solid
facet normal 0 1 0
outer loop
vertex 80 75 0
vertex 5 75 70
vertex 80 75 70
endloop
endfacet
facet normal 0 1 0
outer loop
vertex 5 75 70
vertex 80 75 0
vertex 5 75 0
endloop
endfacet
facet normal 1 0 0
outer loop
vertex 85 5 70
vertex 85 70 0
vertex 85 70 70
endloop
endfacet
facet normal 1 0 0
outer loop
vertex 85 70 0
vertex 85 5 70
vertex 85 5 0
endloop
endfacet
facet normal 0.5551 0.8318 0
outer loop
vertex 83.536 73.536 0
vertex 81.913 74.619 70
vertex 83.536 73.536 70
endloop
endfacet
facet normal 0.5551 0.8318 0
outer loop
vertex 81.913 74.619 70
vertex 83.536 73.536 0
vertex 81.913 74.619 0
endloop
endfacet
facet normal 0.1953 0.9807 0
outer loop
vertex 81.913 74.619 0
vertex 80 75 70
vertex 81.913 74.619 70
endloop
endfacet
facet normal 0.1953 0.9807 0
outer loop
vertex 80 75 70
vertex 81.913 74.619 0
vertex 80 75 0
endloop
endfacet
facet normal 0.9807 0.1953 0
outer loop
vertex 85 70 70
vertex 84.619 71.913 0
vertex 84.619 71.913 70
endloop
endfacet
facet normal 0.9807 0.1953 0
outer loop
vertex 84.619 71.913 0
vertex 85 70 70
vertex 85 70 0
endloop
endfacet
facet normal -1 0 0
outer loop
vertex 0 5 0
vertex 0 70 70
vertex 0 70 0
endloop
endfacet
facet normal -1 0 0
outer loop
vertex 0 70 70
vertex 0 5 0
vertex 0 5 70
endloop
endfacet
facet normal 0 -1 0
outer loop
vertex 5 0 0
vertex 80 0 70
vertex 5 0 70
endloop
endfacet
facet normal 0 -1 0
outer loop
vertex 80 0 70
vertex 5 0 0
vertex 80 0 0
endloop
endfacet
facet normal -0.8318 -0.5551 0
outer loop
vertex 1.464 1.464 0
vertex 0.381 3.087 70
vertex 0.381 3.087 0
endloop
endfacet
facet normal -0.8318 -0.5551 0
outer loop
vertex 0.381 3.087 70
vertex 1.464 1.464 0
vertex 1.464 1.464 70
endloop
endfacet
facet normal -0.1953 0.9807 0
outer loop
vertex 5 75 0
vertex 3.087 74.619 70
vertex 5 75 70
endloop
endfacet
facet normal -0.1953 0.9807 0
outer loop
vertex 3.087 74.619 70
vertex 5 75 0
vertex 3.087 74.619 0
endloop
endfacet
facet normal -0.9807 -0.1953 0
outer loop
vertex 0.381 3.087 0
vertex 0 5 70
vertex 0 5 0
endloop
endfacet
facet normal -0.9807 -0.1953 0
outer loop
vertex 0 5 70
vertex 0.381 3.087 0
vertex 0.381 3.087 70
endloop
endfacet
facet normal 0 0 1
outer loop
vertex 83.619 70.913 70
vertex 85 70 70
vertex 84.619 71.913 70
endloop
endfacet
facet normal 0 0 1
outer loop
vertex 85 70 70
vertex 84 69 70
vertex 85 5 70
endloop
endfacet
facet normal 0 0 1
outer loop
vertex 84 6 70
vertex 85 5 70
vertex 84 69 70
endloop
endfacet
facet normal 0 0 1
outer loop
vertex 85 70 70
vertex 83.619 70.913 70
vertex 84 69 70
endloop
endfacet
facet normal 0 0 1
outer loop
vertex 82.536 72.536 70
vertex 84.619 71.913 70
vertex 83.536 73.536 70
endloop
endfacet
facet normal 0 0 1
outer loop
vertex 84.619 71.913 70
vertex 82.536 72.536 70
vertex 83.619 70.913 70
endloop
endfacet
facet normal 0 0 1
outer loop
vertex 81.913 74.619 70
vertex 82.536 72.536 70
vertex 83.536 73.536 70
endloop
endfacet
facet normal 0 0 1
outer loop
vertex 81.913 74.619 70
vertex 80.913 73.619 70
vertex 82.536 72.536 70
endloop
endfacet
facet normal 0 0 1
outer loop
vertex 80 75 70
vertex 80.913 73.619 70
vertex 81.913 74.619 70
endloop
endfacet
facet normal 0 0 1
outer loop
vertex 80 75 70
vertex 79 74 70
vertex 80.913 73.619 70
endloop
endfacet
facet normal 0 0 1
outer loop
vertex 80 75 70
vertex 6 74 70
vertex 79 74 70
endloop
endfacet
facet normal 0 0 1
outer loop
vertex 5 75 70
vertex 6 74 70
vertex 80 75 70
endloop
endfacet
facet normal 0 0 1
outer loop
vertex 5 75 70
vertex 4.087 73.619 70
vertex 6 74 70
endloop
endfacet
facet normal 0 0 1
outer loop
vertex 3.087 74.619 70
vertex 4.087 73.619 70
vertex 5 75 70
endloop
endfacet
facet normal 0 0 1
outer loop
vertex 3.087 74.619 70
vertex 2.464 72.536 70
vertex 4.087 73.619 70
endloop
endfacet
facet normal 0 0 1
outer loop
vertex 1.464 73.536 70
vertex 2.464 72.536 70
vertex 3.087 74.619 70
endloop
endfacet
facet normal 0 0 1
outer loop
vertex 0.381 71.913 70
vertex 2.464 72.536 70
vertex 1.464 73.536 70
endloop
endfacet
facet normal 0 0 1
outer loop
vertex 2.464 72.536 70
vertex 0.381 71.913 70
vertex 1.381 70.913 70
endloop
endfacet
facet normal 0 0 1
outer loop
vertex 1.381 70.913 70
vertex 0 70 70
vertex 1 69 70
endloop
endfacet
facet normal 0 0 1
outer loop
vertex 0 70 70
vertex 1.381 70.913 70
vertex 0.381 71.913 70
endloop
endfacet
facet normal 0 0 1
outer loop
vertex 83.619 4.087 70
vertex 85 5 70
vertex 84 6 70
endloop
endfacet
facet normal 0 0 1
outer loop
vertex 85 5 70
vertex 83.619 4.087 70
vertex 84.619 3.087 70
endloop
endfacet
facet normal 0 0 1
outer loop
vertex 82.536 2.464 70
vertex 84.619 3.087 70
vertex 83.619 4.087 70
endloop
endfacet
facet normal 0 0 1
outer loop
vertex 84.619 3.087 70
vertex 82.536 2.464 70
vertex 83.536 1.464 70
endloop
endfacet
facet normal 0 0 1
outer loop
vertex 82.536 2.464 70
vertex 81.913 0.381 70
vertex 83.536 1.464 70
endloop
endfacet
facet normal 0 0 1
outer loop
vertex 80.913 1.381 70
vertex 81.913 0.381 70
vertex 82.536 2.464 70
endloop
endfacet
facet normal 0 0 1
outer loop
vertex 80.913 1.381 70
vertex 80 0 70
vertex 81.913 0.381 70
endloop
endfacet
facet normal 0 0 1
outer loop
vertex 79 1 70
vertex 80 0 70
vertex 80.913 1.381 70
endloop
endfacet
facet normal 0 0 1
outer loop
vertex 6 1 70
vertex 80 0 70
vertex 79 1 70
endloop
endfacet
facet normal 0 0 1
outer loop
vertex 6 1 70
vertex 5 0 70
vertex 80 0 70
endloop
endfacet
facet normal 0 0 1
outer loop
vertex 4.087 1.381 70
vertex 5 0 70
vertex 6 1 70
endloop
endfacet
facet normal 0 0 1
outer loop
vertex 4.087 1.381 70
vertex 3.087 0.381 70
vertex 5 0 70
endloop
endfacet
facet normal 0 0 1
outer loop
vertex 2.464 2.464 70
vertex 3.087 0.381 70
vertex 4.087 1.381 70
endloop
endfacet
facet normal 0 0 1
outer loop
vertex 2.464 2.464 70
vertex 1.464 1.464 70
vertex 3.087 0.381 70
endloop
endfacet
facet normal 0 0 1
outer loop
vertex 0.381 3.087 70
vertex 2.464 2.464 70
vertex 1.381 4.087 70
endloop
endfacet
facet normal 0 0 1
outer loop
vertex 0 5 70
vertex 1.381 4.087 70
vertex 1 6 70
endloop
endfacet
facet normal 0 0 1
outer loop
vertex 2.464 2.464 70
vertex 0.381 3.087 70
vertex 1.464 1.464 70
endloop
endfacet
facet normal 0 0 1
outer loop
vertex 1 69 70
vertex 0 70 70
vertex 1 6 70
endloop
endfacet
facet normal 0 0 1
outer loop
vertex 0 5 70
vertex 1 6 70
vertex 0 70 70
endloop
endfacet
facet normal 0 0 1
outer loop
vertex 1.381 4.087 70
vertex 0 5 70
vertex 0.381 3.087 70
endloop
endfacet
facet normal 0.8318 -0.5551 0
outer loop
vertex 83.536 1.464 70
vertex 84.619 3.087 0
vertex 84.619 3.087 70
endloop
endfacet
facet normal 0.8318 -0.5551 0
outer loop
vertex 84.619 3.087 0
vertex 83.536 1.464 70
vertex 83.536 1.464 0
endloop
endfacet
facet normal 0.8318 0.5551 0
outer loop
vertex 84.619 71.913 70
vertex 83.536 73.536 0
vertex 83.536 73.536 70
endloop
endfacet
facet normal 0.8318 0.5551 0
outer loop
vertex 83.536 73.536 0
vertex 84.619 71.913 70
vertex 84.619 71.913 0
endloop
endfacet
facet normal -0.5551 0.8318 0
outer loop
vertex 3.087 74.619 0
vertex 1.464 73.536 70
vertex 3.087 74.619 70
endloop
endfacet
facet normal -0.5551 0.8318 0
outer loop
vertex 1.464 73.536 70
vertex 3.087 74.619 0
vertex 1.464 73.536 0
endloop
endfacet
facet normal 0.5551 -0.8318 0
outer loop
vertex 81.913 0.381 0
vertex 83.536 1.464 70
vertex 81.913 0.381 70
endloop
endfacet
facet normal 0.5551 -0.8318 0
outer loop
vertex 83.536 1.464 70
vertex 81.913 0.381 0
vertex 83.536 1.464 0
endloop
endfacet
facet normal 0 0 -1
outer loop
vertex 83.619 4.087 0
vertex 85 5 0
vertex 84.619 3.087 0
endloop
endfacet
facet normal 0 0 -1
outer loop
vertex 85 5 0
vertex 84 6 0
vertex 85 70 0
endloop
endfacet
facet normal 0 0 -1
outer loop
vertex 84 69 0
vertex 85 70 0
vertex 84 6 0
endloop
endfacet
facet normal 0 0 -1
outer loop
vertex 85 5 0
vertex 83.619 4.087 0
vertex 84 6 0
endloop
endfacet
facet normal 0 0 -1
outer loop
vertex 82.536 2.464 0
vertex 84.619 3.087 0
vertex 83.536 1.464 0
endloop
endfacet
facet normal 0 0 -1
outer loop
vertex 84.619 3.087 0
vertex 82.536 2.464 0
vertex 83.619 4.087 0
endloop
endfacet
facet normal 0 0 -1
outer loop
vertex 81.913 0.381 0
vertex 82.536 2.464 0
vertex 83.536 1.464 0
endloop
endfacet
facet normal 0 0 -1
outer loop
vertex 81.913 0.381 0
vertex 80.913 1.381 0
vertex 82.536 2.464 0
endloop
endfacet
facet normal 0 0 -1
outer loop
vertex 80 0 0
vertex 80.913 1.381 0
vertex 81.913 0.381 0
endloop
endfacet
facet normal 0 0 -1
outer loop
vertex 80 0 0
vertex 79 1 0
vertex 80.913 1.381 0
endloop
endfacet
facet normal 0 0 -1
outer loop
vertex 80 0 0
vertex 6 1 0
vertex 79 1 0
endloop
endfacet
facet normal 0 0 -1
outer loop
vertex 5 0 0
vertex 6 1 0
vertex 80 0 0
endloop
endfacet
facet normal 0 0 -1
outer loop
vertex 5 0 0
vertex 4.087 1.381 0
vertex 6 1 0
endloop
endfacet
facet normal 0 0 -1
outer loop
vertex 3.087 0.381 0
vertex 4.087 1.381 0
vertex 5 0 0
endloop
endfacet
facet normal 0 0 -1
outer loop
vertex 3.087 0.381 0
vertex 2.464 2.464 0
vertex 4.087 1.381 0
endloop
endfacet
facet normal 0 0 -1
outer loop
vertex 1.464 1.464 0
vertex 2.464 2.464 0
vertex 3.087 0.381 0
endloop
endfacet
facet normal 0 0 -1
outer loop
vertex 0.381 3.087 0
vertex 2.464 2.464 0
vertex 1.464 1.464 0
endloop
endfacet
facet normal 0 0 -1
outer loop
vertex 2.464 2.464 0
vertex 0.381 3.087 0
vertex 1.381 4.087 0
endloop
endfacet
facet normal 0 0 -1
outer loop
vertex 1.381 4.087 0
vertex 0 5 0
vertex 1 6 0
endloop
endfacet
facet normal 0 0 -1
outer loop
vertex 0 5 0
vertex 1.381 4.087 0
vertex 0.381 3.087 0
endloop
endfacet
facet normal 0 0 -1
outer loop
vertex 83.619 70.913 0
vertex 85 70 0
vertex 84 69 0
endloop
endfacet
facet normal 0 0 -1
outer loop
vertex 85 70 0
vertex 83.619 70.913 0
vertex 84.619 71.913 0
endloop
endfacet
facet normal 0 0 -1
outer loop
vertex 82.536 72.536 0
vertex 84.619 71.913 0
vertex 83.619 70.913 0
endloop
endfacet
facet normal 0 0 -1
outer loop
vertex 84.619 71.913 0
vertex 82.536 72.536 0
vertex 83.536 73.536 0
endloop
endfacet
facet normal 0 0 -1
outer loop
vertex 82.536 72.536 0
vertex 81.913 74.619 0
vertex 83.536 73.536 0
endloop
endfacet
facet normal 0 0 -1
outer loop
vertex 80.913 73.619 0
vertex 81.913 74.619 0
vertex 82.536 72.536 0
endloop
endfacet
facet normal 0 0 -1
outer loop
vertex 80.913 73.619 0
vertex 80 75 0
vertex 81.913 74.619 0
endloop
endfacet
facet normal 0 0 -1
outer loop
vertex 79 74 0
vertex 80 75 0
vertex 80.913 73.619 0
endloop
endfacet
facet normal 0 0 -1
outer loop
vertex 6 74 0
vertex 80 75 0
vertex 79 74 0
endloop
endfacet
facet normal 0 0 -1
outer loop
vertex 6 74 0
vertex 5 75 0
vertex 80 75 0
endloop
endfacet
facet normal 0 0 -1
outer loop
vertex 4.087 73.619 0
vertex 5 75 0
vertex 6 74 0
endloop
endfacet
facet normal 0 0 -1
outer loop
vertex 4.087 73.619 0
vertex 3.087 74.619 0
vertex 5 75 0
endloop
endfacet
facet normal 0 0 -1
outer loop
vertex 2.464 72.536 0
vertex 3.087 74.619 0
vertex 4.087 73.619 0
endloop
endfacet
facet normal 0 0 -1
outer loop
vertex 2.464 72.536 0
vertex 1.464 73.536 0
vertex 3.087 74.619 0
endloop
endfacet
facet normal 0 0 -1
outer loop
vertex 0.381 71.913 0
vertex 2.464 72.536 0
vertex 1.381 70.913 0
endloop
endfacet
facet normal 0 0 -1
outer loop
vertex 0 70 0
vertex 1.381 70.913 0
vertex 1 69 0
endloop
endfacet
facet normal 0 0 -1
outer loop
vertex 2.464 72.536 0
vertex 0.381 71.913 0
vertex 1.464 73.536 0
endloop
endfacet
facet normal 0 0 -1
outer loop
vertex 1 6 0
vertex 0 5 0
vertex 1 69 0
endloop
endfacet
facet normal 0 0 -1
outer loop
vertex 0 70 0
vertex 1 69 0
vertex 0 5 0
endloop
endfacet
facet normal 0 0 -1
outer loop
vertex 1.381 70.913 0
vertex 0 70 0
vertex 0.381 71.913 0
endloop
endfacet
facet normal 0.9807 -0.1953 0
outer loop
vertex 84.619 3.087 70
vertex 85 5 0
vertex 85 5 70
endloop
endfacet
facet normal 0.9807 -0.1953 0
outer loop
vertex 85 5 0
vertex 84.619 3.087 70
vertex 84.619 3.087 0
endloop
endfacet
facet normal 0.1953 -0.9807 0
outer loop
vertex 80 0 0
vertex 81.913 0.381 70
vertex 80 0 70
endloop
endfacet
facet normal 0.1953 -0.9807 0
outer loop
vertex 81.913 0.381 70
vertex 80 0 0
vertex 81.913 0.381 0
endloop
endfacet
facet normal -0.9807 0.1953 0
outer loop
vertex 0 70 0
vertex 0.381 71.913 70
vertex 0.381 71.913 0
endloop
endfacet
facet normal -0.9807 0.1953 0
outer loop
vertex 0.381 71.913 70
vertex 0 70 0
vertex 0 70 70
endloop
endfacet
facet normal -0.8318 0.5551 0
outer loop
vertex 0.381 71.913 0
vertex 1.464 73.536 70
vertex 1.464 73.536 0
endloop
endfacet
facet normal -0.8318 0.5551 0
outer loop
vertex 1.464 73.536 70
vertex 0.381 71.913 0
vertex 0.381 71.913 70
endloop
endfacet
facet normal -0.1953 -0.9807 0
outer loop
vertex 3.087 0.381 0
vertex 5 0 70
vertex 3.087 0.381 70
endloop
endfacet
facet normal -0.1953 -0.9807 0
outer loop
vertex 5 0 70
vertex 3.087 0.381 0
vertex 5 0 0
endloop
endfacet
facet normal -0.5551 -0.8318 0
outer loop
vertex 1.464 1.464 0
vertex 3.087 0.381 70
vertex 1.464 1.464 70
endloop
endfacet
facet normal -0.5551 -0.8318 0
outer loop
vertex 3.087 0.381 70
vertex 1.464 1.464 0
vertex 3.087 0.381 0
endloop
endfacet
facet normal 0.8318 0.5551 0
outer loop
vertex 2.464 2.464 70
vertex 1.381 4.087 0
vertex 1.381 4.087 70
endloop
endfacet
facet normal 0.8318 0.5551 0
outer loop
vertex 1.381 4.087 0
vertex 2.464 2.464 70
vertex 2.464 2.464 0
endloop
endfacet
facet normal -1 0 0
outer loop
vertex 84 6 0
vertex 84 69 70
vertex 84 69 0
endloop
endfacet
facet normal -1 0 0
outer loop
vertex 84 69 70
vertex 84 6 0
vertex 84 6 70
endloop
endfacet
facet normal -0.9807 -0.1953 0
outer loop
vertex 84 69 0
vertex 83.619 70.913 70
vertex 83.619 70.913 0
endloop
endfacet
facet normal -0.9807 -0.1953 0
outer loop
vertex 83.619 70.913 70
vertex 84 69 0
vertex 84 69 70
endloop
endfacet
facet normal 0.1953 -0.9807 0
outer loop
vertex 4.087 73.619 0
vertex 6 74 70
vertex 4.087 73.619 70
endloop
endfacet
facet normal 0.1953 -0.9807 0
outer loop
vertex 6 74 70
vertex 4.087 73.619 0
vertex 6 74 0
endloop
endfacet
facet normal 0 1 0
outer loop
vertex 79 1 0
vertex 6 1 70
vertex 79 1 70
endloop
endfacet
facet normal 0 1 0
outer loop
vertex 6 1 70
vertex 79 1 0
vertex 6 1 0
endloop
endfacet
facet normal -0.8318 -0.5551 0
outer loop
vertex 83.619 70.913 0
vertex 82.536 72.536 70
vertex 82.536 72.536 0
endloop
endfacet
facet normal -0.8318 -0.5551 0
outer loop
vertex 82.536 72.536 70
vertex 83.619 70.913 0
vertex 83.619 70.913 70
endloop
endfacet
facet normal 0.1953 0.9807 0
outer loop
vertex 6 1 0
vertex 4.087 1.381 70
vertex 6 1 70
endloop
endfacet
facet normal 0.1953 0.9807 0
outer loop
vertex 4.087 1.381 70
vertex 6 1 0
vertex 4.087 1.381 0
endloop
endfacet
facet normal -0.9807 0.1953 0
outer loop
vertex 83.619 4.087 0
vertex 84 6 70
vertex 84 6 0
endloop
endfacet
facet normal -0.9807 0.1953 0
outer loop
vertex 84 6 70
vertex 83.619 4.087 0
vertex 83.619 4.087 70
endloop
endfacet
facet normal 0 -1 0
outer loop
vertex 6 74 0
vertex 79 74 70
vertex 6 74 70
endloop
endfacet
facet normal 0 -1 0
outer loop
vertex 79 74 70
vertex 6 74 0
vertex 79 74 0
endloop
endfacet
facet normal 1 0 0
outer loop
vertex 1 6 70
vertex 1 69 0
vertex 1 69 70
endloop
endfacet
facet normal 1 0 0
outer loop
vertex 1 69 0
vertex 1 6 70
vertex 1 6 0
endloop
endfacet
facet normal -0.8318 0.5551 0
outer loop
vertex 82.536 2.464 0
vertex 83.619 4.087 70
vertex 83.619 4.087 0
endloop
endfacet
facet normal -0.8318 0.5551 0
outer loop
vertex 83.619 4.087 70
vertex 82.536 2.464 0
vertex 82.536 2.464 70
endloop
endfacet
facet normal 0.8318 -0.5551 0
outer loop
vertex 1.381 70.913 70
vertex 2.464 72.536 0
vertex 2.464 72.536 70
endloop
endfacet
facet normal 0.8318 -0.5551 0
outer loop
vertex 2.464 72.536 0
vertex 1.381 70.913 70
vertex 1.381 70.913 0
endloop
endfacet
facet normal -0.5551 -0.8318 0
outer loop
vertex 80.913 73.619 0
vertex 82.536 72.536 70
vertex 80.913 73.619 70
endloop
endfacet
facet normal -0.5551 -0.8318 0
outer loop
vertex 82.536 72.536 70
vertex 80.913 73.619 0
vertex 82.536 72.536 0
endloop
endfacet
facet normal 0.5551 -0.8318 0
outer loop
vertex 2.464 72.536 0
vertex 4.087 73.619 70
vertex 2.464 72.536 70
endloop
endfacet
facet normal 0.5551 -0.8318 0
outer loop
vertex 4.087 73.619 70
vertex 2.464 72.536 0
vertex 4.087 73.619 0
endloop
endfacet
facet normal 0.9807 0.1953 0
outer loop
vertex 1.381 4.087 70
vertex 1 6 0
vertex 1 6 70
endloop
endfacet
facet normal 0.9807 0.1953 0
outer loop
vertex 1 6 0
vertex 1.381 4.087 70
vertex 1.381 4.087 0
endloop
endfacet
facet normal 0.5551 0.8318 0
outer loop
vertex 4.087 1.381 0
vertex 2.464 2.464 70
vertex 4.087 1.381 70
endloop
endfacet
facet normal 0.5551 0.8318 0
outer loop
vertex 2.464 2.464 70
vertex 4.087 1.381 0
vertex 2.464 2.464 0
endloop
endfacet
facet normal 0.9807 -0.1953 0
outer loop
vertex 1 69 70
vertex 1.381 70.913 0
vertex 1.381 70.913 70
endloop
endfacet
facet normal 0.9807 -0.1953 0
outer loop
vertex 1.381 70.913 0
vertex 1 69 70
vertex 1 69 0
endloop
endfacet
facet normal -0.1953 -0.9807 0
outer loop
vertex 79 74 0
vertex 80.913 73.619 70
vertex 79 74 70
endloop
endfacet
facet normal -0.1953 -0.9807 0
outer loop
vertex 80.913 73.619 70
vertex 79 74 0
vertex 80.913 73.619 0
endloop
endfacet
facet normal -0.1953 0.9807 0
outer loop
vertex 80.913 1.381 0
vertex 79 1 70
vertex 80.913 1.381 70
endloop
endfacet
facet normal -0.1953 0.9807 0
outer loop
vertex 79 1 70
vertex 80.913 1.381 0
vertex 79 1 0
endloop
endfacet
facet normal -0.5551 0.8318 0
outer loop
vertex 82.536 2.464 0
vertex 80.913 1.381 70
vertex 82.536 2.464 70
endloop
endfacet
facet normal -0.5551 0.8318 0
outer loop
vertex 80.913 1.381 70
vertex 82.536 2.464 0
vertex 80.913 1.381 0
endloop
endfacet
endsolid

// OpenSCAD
altura=70;
ancho=90-5;
largo=80-5;
grosor=1;
difference(){
hull(){
  translate([5,5,0])cylinder(altura,r=5);
  translate([ancho-10,0,0])
  translate([5,5,0])cylinder(altura,r=5);
  translate([ancho-10,largo-10,0])
  translate([5,5,0])cylinder(altura,r=5);
  translate([0,largo-10,0])
  translate([5,5,0])cylinder(altura,r=5);
}
translate([0,0,-10])
hull(){
  translate([5+grosor,5+grosor,0])cylinder(altura+20,r=5);
  translate([ancho-10-grosor,grosor,0])
  translate([5,5,0])cylinder(altura+20,r=5);
  translate([ancho-10-grosor,largo-10-grosor,0])
  translate([5,5,0])cylinder(altura+20,r=5);
  translate([grosor,largo-10-grosor,0])
  translate([5,5,0])cylinder(altura+20,r=5);
}
}
